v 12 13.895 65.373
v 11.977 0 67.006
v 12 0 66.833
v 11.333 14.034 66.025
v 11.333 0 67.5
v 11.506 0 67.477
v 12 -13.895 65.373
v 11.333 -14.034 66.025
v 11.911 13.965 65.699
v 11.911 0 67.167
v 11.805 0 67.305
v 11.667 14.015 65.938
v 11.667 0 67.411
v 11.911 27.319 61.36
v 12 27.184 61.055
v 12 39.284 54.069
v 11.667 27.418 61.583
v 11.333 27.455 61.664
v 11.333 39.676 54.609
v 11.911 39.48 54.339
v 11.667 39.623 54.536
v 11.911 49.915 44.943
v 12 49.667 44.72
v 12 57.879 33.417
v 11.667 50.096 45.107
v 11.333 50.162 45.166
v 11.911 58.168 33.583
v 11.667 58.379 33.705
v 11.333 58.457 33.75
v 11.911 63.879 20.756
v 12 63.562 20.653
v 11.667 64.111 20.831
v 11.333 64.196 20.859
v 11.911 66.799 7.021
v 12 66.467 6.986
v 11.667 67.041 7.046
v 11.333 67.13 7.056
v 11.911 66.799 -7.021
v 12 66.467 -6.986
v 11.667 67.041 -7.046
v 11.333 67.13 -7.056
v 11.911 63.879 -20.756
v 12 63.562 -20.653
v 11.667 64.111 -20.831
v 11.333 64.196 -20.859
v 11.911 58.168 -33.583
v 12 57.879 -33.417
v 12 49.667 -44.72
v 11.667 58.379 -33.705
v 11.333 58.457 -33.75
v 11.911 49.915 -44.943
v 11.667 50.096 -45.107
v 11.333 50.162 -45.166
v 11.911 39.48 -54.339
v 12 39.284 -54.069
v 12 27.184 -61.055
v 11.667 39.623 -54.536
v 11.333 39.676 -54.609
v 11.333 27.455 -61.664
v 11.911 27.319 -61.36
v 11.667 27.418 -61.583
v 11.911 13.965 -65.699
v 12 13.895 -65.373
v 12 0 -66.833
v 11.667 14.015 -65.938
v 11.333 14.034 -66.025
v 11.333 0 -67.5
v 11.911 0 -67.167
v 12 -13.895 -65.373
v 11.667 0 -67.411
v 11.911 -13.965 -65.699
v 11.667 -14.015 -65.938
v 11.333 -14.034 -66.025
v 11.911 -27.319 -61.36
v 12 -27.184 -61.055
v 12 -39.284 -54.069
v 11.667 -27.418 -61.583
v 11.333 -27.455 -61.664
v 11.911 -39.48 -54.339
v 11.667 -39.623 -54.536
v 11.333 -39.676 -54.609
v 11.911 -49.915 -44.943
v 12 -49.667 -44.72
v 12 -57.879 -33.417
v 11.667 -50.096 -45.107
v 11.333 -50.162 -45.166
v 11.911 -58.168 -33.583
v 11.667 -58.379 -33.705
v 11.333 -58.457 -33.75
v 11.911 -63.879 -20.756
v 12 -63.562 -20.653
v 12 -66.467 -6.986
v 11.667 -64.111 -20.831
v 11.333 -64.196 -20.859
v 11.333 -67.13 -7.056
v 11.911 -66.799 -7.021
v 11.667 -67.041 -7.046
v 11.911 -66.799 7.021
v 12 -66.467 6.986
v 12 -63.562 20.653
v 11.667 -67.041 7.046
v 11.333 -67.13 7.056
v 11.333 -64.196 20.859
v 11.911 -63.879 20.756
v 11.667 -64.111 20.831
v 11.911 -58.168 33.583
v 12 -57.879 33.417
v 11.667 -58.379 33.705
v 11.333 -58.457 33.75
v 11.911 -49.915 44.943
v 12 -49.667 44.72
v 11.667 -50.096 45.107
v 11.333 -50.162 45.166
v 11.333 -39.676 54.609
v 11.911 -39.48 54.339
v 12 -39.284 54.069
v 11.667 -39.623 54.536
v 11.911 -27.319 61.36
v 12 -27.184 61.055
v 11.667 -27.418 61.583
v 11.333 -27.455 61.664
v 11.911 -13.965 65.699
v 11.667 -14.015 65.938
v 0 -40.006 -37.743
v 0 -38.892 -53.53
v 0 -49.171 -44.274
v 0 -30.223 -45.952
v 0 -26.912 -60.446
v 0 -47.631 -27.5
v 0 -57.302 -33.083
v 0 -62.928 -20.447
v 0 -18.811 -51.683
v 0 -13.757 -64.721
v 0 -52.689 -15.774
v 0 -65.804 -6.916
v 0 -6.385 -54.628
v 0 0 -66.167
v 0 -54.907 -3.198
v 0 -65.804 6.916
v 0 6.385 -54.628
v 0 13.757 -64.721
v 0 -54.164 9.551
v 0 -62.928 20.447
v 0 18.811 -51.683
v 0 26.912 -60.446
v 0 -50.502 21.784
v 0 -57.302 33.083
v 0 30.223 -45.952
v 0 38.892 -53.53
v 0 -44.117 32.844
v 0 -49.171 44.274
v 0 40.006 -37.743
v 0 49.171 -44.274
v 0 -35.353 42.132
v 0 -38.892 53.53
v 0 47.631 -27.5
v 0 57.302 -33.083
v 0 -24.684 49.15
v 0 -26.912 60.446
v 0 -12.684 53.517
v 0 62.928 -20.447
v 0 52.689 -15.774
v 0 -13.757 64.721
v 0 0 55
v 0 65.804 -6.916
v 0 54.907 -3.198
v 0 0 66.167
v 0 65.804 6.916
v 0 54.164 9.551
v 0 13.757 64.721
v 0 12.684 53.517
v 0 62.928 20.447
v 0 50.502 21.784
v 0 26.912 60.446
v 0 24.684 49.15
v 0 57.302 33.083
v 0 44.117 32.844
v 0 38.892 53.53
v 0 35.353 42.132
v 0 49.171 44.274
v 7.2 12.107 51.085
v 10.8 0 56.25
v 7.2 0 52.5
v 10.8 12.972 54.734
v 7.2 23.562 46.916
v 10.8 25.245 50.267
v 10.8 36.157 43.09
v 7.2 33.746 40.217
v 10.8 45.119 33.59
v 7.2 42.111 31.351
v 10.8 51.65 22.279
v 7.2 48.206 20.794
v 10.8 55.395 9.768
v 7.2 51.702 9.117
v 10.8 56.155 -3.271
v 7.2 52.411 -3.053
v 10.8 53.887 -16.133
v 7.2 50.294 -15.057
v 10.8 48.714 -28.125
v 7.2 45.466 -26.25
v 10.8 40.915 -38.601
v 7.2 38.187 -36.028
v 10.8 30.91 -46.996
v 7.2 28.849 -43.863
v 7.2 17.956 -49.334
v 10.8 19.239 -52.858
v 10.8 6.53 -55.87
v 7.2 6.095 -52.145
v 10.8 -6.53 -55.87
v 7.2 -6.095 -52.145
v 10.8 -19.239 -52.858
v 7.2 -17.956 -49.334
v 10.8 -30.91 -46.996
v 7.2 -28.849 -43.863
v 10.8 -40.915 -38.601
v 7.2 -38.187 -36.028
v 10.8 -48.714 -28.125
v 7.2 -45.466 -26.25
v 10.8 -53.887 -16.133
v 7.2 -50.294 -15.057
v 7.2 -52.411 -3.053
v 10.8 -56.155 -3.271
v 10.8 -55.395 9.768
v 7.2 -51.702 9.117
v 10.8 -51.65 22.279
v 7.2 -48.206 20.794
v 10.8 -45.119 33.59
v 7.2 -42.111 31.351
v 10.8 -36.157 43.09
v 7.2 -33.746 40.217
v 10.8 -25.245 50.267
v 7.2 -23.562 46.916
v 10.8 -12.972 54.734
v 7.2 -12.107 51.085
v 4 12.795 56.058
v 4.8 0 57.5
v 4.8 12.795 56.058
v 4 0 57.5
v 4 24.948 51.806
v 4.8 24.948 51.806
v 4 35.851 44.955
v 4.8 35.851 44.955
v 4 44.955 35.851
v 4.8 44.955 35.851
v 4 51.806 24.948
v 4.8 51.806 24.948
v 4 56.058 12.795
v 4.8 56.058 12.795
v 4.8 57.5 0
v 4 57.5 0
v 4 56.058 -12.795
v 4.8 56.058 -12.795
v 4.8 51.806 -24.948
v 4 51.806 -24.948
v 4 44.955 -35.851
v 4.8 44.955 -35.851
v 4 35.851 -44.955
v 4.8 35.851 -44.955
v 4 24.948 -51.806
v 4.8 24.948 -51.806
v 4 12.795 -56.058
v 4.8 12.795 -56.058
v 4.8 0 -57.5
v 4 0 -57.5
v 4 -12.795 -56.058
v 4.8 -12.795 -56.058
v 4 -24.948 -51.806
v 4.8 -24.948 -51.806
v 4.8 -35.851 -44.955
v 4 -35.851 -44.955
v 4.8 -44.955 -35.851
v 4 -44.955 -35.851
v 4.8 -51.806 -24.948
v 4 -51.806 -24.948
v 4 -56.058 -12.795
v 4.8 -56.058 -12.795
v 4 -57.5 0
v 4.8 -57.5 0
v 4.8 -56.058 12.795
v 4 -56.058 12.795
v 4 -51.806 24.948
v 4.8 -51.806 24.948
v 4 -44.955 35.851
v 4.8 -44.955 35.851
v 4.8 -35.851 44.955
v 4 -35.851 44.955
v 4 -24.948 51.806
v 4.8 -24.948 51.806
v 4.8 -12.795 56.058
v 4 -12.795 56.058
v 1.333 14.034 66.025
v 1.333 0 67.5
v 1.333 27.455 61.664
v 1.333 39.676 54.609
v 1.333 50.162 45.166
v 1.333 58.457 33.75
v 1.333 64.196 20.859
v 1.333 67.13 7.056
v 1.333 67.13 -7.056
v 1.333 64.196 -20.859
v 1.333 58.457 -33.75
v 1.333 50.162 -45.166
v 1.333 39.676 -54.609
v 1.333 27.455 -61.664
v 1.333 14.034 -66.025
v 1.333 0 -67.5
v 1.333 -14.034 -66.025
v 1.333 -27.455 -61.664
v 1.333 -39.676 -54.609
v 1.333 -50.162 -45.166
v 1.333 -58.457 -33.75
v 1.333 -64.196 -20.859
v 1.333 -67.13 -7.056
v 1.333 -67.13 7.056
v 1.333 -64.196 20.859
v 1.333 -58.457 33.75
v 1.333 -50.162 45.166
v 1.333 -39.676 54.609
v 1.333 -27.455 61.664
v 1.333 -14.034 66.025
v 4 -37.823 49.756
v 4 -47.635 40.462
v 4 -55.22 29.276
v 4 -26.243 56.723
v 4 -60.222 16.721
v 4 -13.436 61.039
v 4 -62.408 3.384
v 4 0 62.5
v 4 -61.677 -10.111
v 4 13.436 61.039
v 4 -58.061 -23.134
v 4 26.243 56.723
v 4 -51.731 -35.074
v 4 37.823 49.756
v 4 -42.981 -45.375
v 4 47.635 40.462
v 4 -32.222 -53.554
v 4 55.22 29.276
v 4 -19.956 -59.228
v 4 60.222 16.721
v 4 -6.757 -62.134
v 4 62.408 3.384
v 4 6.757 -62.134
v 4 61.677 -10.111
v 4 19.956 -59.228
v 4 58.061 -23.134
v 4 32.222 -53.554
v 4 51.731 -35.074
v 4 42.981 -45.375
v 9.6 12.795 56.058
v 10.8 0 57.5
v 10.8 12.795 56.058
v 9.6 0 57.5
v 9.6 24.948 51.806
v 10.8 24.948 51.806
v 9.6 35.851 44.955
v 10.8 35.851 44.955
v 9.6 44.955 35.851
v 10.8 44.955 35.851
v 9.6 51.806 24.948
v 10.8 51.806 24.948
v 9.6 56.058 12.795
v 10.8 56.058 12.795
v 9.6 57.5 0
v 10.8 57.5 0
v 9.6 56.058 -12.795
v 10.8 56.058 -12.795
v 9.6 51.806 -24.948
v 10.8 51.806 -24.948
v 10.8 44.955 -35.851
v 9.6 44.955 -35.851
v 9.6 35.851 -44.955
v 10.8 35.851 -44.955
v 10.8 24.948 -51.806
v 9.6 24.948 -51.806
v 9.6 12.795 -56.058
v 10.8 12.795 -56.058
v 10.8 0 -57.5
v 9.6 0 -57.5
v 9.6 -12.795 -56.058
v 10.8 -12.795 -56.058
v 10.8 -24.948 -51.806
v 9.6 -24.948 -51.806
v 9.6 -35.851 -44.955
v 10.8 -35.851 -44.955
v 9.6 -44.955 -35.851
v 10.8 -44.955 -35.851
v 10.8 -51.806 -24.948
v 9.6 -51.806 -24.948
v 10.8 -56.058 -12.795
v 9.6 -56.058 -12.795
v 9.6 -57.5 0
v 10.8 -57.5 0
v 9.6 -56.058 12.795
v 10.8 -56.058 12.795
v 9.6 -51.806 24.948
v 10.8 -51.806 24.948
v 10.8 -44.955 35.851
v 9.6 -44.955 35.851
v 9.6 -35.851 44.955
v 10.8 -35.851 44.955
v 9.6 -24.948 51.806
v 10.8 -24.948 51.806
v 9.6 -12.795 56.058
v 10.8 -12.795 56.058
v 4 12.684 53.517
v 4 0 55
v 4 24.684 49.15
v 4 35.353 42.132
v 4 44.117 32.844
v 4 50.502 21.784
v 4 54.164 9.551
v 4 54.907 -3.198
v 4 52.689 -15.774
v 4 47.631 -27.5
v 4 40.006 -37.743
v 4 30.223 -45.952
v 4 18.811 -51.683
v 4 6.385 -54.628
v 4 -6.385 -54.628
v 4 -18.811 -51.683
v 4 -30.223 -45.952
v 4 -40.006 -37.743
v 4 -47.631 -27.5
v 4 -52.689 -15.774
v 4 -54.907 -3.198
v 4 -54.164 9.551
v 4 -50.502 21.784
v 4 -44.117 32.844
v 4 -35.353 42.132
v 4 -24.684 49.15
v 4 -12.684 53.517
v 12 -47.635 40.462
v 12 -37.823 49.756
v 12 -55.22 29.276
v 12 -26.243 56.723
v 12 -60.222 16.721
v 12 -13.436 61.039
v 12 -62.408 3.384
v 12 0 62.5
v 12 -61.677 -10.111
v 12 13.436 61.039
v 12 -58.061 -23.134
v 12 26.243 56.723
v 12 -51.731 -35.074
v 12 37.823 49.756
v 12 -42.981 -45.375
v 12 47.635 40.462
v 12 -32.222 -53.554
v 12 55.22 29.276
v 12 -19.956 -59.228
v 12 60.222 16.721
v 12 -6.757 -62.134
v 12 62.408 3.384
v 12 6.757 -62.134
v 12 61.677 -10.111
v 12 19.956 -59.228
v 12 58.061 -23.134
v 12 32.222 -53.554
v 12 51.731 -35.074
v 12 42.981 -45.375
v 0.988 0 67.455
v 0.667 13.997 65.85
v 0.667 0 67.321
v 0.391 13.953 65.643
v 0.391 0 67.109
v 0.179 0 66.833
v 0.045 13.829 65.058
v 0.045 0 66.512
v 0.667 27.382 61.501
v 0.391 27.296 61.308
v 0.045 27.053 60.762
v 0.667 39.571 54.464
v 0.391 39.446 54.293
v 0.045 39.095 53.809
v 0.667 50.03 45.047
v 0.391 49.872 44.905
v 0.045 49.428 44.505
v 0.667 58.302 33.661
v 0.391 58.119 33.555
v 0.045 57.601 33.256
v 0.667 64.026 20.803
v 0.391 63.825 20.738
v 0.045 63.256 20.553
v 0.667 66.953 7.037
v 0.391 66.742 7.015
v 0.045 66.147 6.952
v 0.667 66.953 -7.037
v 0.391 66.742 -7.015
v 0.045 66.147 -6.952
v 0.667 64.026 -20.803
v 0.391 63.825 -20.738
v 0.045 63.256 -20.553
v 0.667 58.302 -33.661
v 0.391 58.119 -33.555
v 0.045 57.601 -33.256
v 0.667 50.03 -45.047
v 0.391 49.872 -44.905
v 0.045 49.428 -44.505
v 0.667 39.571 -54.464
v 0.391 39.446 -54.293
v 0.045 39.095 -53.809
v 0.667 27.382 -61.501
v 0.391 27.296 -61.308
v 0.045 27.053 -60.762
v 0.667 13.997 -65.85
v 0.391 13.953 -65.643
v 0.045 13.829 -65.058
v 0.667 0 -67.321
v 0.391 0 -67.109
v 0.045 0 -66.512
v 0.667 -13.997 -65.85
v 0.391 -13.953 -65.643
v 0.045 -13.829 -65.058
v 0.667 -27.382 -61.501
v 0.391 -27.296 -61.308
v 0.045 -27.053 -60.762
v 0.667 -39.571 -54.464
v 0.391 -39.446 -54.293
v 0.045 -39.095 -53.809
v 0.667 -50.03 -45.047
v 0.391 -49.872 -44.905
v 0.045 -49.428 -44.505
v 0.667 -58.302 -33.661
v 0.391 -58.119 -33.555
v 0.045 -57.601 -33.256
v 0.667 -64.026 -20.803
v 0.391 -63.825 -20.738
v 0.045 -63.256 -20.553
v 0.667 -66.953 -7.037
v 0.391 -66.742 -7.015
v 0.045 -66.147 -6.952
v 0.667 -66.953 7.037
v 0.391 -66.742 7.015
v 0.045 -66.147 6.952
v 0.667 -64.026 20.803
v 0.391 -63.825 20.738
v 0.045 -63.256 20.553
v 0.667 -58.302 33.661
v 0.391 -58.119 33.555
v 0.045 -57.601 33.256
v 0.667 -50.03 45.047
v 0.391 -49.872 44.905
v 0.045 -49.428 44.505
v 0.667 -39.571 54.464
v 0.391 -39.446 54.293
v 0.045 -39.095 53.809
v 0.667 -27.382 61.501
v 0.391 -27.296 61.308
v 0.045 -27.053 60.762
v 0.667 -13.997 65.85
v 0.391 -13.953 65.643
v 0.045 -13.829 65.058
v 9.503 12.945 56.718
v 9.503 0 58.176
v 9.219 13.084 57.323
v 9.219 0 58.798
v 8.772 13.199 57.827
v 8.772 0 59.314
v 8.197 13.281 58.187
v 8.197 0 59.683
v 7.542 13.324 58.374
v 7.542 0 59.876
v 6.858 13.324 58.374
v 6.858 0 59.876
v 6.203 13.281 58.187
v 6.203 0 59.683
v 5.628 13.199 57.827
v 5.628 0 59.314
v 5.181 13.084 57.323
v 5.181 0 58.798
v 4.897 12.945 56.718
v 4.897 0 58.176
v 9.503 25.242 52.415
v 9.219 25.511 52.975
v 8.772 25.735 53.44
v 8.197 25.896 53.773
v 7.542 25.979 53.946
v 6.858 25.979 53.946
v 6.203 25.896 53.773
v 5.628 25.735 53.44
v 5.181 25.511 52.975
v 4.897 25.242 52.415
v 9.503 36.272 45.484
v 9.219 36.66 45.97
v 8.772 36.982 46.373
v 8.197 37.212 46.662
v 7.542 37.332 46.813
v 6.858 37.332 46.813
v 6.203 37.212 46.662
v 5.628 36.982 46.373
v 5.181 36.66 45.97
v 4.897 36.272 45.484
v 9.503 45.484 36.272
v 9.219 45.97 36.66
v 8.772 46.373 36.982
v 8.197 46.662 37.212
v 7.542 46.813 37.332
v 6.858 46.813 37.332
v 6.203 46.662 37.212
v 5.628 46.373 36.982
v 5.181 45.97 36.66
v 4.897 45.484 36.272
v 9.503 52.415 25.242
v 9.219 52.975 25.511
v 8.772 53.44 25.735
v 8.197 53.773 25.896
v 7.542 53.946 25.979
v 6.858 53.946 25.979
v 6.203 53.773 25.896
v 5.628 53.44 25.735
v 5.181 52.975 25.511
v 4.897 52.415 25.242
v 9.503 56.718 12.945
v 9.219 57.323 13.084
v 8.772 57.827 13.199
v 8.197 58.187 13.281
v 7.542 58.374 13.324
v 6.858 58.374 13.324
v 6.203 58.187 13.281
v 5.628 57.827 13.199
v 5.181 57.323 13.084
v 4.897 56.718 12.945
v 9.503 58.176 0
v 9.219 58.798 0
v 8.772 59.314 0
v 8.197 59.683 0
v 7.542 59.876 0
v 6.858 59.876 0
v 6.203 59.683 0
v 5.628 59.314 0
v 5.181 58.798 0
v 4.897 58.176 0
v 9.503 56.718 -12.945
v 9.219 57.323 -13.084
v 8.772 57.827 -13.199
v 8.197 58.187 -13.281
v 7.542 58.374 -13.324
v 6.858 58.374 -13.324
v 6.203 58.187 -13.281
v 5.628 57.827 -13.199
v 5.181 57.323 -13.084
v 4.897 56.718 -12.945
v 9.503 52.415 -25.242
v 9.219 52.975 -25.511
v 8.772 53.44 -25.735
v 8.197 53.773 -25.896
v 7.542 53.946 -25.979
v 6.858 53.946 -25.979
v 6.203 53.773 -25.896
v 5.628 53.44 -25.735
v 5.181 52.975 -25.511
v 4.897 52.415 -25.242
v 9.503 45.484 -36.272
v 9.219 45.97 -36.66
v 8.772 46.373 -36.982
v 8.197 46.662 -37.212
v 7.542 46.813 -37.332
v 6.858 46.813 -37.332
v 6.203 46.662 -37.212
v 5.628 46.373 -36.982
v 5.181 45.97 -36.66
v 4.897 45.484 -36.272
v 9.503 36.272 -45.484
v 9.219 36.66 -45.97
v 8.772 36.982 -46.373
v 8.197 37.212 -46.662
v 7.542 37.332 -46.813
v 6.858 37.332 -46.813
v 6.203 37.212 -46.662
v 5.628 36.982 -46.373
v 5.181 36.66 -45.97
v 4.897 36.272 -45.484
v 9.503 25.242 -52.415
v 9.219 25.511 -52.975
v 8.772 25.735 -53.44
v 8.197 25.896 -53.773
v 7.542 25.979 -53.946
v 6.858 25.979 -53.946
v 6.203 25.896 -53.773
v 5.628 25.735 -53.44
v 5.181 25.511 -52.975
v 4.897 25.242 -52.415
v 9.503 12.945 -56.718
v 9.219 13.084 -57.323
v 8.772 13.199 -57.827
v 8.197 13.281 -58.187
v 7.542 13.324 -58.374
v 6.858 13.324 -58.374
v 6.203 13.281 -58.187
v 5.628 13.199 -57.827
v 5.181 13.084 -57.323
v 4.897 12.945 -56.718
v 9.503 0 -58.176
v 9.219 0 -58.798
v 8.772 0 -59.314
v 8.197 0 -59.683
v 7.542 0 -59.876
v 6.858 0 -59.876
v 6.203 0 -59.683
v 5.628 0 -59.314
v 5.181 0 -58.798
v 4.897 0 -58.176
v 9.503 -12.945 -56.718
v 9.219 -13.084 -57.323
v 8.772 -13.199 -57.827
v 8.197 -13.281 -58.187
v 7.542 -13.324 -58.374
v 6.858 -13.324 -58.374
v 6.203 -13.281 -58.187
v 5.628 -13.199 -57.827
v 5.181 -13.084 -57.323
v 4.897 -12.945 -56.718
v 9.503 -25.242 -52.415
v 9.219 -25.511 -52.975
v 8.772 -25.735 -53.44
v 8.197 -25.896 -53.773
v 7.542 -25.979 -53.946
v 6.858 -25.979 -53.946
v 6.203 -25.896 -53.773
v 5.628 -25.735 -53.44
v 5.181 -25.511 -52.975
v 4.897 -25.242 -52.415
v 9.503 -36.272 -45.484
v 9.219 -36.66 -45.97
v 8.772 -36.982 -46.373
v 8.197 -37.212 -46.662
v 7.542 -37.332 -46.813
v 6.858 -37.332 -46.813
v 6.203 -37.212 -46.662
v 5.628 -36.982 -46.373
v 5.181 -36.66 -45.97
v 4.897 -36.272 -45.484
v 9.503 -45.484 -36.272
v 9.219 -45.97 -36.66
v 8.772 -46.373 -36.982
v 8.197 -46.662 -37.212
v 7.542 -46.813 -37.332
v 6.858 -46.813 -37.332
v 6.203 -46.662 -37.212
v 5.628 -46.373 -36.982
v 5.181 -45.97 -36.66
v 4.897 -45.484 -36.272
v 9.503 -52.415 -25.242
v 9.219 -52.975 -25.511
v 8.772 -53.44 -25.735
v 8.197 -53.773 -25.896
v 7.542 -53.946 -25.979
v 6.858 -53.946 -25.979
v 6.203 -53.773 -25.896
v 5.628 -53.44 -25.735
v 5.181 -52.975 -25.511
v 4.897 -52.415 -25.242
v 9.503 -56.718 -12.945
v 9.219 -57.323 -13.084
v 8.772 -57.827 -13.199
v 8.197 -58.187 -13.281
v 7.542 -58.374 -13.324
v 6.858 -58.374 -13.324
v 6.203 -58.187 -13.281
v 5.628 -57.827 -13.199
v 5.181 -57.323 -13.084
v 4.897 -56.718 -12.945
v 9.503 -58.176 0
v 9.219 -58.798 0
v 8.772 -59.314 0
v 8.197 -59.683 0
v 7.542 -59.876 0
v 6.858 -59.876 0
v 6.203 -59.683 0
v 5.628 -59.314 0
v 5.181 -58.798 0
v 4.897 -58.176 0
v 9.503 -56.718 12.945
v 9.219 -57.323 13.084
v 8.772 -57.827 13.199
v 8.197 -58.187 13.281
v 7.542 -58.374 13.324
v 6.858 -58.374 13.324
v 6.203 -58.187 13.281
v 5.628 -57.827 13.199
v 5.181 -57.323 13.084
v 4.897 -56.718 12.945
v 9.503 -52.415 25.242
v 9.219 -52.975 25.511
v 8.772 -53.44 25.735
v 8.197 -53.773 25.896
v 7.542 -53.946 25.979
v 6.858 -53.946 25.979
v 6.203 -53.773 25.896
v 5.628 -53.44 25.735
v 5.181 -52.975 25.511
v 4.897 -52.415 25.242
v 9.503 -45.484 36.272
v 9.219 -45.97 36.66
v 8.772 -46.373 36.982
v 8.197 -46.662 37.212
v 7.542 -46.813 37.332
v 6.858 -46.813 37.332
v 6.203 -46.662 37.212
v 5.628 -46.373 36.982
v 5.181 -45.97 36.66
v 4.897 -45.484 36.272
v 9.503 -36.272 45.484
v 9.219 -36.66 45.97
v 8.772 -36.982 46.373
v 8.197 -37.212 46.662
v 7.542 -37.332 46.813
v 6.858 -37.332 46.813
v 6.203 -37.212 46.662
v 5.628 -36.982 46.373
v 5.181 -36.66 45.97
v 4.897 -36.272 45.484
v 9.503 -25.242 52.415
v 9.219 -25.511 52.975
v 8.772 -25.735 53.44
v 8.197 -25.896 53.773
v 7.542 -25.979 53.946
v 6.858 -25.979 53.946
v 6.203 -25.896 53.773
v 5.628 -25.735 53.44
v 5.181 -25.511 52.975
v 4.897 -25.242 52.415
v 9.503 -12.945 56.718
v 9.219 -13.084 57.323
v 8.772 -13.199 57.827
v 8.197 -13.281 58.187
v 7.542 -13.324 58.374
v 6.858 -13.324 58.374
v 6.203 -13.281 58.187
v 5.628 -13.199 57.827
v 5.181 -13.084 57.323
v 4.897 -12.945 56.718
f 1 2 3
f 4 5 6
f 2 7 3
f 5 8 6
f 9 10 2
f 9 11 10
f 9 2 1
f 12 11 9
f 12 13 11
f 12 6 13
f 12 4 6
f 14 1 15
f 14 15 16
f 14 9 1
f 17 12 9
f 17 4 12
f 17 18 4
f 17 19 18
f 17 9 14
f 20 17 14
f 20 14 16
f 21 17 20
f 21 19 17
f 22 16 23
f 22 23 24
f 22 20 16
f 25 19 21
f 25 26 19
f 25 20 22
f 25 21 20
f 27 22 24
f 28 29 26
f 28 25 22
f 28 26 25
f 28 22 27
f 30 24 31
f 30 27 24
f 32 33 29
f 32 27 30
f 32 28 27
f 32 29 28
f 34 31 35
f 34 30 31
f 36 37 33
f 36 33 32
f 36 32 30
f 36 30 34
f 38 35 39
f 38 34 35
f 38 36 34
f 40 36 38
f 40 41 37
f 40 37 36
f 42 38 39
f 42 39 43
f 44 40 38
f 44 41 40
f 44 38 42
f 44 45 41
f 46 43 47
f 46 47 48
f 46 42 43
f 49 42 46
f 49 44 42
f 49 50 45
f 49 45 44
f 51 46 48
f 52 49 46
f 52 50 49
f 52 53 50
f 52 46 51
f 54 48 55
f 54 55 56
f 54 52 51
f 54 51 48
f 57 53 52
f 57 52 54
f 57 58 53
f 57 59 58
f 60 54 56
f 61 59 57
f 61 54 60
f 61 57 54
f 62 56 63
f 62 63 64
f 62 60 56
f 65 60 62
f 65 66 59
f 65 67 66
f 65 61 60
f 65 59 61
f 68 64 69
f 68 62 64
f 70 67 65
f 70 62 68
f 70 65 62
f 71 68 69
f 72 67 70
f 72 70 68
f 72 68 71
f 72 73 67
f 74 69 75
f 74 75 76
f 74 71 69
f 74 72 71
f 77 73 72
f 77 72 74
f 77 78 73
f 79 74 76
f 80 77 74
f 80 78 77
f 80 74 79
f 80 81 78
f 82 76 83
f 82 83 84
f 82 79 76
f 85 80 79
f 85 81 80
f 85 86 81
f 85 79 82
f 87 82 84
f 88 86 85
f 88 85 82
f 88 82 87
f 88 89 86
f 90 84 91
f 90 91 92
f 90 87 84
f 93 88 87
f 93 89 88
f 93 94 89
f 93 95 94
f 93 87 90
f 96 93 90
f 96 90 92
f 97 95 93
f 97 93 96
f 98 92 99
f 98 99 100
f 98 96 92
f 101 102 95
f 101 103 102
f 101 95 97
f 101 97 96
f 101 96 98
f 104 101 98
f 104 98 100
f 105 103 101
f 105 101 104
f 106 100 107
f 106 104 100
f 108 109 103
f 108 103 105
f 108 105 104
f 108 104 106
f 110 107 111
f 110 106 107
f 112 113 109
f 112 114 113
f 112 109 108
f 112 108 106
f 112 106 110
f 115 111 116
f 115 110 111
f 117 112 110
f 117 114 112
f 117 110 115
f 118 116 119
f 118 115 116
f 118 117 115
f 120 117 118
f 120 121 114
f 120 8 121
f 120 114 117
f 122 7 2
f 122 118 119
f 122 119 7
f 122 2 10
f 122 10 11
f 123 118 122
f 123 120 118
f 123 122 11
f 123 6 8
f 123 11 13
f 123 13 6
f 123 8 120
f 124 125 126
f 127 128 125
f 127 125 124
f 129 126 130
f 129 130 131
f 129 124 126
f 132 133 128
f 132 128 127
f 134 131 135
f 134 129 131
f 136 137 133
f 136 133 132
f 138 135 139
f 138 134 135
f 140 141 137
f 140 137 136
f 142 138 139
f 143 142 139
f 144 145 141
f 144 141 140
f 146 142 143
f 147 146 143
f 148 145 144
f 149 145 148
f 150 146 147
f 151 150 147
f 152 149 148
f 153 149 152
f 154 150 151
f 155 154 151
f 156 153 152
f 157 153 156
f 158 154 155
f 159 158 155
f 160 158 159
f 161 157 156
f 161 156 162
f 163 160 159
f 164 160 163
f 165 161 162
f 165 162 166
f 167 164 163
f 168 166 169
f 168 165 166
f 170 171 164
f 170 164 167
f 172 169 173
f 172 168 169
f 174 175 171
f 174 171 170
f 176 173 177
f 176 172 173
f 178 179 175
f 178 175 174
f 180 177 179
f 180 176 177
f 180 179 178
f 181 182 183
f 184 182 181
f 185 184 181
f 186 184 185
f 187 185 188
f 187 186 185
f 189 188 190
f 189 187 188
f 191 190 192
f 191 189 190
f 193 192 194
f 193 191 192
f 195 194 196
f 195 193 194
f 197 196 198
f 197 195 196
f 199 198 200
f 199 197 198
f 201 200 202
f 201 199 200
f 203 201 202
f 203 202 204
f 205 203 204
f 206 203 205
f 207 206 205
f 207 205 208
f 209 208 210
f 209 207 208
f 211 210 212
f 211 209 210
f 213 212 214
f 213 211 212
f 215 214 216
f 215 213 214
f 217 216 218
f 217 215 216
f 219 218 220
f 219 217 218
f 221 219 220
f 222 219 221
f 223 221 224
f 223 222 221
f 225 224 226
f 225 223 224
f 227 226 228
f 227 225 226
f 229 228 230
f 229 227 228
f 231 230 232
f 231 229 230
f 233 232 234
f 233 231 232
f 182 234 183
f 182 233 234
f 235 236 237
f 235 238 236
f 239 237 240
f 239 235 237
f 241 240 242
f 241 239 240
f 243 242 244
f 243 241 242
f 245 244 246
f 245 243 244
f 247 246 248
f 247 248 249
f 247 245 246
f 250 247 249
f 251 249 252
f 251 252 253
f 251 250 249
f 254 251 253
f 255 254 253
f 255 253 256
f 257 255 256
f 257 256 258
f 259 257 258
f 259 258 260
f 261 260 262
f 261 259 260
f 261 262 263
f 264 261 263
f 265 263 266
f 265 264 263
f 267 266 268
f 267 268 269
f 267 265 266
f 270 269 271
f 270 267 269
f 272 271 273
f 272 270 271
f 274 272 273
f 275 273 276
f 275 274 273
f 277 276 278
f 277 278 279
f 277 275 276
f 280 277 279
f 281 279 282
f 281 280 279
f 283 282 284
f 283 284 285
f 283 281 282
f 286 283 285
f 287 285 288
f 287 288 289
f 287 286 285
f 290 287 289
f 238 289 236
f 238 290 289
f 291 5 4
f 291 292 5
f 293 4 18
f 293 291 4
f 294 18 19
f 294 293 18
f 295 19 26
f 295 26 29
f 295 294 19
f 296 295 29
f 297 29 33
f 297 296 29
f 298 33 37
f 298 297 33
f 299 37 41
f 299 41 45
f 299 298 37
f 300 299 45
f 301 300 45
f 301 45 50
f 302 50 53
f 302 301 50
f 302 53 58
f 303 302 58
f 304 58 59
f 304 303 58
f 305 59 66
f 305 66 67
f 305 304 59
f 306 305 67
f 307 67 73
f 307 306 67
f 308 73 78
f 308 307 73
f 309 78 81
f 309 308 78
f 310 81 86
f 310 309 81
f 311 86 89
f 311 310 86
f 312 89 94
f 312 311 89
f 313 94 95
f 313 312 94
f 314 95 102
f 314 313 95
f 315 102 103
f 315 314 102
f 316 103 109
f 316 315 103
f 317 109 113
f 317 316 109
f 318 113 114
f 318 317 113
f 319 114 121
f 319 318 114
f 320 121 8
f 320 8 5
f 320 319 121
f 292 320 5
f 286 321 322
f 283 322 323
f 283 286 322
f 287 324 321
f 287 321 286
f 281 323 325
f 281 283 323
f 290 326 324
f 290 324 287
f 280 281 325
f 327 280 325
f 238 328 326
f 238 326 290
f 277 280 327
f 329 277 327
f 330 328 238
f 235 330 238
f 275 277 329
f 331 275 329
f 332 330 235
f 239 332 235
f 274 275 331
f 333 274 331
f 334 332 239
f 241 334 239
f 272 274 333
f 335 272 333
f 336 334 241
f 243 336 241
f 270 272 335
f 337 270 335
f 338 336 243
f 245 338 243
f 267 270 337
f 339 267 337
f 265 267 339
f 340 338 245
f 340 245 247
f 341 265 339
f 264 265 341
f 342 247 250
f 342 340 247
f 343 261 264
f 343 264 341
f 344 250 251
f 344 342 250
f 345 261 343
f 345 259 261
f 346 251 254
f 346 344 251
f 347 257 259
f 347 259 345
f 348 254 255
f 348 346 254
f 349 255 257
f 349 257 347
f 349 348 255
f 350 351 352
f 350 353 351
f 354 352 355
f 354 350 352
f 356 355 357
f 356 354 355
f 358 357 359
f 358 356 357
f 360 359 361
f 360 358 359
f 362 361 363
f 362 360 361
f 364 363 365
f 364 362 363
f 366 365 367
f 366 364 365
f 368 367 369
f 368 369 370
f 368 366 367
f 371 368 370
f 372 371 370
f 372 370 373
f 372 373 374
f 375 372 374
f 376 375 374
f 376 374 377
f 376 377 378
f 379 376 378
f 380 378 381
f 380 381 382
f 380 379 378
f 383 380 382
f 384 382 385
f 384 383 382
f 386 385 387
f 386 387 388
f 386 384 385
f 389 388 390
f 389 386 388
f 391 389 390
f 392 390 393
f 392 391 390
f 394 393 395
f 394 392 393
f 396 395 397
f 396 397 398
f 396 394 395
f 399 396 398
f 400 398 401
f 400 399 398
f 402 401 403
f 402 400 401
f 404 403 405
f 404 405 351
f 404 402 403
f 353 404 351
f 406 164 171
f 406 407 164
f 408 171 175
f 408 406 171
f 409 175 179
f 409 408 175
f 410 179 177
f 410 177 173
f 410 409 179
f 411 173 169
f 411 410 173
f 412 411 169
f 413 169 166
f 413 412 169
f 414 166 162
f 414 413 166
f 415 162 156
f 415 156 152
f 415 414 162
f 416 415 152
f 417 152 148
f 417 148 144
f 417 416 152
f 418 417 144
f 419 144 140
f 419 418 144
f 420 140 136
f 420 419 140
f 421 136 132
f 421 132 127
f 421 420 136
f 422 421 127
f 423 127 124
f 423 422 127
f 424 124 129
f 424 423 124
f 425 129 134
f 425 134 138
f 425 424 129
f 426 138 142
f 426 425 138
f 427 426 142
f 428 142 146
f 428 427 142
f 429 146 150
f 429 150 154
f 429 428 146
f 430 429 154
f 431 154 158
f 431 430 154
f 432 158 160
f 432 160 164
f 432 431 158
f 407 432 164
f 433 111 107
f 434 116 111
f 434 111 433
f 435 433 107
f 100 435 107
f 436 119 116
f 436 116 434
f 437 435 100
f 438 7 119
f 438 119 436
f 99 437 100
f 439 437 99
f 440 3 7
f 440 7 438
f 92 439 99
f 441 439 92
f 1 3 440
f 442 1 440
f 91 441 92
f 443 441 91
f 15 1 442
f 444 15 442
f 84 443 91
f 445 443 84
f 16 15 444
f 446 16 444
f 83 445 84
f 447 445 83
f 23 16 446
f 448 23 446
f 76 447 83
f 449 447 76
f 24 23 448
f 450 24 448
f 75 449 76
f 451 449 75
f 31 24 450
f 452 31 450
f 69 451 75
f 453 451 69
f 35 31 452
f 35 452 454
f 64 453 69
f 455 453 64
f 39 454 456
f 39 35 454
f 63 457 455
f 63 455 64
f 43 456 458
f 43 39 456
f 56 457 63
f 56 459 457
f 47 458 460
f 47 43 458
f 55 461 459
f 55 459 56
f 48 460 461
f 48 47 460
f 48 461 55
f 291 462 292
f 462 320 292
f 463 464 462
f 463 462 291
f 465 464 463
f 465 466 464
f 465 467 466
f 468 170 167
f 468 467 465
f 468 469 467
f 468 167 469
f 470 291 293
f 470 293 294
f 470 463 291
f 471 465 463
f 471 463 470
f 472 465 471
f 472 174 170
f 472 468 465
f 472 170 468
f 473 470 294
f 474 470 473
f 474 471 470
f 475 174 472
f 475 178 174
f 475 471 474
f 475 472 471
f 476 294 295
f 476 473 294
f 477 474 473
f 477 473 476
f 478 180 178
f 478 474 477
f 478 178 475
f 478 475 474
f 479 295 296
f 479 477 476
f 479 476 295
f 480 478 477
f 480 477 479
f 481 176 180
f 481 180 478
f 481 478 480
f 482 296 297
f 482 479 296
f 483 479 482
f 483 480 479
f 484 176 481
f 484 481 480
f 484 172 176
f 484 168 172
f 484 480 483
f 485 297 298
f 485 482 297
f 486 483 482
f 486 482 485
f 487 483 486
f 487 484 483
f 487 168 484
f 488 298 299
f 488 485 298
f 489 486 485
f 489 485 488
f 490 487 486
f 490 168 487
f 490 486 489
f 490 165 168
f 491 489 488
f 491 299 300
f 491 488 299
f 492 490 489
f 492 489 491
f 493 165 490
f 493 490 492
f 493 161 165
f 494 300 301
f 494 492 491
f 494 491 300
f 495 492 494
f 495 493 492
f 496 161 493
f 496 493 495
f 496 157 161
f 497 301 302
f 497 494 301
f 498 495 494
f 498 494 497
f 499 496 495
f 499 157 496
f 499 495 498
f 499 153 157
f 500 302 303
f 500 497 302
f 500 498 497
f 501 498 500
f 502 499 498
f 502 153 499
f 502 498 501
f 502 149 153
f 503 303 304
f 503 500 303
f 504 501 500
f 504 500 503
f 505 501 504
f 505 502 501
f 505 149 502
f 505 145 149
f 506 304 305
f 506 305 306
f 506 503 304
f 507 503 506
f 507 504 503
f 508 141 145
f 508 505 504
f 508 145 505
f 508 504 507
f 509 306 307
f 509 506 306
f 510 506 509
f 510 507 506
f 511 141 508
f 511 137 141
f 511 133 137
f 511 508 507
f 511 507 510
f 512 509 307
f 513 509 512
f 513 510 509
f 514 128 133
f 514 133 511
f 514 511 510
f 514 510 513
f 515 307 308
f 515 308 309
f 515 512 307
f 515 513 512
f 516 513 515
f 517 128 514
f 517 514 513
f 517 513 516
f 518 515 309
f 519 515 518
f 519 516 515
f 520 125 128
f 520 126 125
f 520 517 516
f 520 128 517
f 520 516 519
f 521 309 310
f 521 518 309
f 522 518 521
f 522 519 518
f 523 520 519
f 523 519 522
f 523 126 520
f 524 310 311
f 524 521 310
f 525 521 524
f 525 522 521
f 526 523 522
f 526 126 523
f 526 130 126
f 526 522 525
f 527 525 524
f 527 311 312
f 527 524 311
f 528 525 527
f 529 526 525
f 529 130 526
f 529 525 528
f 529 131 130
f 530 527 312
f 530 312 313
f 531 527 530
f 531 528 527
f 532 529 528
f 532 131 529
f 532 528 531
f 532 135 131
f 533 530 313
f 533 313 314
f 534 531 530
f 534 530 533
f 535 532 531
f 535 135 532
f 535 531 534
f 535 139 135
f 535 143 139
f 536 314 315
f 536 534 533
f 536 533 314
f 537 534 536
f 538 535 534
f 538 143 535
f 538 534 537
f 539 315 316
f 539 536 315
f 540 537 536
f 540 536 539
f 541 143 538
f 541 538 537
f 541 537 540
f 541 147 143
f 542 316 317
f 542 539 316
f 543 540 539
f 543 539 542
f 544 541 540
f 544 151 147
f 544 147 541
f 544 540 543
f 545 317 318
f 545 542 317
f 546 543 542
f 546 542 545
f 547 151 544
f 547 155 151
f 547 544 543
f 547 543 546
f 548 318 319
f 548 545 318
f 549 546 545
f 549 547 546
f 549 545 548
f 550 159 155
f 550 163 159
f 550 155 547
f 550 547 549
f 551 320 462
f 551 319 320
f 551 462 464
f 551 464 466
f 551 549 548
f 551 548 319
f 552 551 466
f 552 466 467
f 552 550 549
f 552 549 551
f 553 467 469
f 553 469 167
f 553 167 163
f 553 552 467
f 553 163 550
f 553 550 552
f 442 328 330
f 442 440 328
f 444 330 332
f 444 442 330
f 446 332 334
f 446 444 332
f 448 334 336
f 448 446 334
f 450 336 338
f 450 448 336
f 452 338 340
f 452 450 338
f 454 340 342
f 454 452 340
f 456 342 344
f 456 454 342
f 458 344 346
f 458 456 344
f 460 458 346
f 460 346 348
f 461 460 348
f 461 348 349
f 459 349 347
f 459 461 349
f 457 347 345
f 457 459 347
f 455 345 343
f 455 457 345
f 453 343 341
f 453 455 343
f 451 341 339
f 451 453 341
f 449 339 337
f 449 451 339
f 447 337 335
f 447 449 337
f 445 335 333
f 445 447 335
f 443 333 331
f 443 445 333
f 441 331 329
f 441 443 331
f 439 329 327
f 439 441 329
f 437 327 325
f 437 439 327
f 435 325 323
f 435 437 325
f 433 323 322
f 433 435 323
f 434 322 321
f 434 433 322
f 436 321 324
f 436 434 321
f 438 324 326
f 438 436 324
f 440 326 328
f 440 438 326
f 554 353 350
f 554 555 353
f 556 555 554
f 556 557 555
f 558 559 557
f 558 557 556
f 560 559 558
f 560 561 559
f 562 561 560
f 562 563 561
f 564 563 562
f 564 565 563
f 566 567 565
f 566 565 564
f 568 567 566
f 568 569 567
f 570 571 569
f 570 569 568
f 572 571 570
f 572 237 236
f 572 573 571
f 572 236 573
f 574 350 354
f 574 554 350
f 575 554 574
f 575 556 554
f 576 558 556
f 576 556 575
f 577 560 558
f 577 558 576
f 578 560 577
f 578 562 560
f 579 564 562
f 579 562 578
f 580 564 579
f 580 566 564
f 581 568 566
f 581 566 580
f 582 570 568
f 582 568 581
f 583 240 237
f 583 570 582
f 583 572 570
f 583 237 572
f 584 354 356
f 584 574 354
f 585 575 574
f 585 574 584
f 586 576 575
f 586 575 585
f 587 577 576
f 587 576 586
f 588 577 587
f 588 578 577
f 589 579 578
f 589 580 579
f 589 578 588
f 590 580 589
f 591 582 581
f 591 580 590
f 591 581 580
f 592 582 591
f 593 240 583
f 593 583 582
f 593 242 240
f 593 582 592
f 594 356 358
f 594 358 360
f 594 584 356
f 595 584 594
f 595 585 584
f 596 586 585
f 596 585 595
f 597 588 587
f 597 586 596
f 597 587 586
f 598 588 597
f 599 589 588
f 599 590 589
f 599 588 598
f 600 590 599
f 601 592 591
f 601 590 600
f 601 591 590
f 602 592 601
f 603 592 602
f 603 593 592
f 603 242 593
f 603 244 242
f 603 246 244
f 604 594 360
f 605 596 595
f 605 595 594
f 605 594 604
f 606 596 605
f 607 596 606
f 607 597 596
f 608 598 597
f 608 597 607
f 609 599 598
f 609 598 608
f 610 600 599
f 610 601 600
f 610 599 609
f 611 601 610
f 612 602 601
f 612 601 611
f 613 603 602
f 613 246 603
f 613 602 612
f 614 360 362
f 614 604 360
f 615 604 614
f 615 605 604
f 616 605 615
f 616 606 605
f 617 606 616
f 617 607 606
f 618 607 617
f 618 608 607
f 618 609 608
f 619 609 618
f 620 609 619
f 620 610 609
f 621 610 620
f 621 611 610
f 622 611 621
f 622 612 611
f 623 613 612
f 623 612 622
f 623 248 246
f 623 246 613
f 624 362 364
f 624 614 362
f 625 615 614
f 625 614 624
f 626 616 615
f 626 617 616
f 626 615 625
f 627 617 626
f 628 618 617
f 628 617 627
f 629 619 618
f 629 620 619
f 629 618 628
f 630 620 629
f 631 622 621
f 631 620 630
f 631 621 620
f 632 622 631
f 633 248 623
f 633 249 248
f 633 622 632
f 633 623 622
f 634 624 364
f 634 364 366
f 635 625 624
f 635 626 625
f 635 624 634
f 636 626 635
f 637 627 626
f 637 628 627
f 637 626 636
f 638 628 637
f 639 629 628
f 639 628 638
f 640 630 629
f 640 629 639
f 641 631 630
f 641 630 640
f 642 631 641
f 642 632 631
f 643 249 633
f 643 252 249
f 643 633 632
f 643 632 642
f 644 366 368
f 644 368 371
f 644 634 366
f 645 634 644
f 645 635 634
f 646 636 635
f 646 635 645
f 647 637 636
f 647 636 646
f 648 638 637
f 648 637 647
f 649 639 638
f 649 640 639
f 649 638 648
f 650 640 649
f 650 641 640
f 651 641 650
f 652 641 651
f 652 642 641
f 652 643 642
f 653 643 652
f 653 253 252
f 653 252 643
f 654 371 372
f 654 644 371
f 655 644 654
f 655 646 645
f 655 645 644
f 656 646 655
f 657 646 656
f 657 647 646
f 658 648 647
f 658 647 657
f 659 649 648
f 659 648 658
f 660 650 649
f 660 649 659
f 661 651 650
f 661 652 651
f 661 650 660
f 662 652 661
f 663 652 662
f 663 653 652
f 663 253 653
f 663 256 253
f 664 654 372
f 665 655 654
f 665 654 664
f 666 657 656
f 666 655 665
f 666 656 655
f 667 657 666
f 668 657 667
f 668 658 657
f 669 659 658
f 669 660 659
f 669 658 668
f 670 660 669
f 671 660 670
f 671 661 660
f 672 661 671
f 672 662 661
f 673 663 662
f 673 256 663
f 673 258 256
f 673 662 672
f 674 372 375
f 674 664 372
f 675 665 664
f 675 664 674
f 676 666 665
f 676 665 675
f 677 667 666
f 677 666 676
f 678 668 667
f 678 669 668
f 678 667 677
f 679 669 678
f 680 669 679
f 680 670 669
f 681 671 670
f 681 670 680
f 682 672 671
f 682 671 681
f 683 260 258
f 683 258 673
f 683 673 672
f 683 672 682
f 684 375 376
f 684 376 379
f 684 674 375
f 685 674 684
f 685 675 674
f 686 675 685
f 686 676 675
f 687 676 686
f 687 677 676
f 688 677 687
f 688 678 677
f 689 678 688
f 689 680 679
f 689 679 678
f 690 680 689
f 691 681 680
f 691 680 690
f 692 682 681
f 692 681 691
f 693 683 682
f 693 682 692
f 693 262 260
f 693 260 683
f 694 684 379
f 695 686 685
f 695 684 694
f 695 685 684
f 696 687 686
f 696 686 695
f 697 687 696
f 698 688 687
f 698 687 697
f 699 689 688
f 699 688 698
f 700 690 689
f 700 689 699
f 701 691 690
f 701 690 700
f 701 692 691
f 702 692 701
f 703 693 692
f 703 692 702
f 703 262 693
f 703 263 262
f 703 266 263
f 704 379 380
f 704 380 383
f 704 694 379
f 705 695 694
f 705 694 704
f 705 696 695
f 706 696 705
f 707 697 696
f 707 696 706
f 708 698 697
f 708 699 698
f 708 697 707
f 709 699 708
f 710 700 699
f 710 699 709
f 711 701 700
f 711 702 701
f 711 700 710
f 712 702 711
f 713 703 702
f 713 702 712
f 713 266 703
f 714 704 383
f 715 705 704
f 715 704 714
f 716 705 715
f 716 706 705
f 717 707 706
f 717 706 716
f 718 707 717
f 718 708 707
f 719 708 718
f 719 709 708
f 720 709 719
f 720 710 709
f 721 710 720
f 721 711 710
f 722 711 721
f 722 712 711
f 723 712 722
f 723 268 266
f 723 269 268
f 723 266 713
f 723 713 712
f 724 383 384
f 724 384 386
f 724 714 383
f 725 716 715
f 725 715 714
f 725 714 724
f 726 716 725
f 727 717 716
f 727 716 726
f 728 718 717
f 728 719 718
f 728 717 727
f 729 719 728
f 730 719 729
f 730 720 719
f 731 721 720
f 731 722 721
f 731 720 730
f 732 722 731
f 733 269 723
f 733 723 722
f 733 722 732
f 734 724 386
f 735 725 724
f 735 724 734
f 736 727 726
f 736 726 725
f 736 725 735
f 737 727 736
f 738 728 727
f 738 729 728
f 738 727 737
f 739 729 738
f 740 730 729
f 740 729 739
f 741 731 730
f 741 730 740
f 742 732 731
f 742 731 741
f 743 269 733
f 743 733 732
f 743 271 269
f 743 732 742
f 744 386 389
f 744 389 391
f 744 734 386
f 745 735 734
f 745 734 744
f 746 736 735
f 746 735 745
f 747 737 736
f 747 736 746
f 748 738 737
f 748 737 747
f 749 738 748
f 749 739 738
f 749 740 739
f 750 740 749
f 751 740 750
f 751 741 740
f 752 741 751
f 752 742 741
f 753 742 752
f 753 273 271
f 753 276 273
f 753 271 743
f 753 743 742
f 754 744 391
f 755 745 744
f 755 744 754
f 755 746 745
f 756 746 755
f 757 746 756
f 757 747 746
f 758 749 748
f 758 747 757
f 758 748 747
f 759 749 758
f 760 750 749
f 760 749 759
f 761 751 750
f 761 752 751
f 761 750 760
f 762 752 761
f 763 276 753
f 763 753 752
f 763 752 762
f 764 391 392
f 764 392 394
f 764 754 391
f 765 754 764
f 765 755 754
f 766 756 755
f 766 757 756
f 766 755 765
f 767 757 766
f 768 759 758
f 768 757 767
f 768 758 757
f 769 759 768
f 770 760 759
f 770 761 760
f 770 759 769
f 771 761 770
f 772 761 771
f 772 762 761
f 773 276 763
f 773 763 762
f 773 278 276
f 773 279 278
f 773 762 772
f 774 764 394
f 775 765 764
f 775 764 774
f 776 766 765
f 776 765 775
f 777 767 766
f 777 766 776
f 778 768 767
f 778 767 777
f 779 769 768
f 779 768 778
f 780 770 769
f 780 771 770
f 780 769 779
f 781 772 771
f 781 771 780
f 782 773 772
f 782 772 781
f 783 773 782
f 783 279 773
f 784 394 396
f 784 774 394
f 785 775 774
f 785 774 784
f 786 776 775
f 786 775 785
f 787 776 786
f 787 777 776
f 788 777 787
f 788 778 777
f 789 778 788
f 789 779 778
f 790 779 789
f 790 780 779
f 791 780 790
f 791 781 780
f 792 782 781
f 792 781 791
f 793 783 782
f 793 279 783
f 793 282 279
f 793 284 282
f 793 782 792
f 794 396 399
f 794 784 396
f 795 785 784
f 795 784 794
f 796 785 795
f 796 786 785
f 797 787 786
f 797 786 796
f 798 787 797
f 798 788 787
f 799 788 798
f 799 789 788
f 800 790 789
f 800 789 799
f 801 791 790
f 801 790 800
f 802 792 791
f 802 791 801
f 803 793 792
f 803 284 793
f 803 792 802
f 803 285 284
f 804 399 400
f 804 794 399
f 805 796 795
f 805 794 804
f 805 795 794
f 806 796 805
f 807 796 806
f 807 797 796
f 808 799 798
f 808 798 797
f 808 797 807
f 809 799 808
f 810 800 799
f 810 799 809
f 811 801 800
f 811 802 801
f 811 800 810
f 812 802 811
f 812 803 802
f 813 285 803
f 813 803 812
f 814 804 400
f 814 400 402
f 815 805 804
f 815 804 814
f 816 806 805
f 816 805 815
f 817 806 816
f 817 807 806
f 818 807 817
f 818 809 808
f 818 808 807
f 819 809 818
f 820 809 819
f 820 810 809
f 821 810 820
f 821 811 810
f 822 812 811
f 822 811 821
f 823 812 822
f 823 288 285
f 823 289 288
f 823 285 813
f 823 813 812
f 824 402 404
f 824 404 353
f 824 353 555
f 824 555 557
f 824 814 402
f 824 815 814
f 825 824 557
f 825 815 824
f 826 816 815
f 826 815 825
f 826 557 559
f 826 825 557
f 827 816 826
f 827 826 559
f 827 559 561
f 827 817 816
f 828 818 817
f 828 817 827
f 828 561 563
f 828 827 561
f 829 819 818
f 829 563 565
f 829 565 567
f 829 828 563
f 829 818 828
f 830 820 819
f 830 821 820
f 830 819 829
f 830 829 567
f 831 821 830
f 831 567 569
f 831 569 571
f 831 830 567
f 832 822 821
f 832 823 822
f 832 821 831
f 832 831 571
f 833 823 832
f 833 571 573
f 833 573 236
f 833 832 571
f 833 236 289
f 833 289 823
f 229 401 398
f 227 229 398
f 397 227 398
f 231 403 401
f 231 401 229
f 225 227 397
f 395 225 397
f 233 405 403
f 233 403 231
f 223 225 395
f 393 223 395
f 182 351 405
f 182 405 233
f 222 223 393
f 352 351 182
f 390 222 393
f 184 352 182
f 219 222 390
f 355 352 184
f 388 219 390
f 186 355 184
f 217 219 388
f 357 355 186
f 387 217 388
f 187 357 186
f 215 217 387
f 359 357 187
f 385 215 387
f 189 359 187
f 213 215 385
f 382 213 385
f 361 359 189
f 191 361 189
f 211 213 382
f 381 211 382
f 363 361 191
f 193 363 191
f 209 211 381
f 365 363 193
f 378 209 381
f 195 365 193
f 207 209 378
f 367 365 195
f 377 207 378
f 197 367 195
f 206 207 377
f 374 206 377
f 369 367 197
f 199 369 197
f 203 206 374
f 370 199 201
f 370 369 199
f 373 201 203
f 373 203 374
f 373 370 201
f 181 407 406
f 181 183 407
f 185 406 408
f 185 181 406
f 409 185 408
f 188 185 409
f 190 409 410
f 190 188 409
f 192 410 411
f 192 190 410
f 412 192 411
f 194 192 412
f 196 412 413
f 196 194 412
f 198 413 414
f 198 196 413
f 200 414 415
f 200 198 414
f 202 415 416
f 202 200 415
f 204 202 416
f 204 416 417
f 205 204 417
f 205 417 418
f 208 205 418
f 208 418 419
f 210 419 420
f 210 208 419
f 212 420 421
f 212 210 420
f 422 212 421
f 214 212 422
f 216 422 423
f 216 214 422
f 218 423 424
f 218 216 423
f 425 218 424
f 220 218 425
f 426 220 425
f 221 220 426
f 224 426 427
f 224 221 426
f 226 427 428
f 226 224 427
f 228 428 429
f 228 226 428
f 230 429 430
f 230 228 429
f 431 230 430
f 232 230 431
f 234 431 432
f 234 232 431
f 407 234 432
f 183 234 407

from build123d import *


with BuildPart() as part:
    # Schizzo1 → Rivoluzione1 (revolve)
    with BuildSketch(Plane.XY, mode=Mode.PRIVATE) as rivoluzione1_sk:
        with BuildLine():
            Line((0, 66.166666667), (0, 55))
            Line((0, 55), (4, 55))
            Line((4, 55), (7.2, 52.5))
            Line((7.2, 52.5), (10.8, 56.25))
            Line((10.8, 56.25), (10.8, 57.5))
            Line((10.8, 57.5), (9.6, 57.5))
            ThreePointArc((9.6, 57.5), (7.2, 59.9), (4.8, 57.5))
            Line((4.8, 57.5), (4, 57.5))
            Line((4, 57.5), (4, 62.5))
            Line((4, 62.5), (12, 62.5))
            Line((12, 62.5), (12, 66.833333333))
            ThreePointArc((12, 66.833333333), (11.804737854, 67.304737854), (11.333333333, 67.5))
            Line((11.333333333, 67.5), (1.333333333, 67.5))
            ThreePointArc((1.333333333, 67.5), (0.390524292, 67.109475708), (0, 66.166666667))
        make_face()
    revolve(rivoluzione1_sk.sketch.rotate(Axis((11.333333333, 0, 0), (-1, 0, 0)), 270), axis=Axis((11.333333333, 0, 0), (-1, 0, 0)))


solid = part.part
